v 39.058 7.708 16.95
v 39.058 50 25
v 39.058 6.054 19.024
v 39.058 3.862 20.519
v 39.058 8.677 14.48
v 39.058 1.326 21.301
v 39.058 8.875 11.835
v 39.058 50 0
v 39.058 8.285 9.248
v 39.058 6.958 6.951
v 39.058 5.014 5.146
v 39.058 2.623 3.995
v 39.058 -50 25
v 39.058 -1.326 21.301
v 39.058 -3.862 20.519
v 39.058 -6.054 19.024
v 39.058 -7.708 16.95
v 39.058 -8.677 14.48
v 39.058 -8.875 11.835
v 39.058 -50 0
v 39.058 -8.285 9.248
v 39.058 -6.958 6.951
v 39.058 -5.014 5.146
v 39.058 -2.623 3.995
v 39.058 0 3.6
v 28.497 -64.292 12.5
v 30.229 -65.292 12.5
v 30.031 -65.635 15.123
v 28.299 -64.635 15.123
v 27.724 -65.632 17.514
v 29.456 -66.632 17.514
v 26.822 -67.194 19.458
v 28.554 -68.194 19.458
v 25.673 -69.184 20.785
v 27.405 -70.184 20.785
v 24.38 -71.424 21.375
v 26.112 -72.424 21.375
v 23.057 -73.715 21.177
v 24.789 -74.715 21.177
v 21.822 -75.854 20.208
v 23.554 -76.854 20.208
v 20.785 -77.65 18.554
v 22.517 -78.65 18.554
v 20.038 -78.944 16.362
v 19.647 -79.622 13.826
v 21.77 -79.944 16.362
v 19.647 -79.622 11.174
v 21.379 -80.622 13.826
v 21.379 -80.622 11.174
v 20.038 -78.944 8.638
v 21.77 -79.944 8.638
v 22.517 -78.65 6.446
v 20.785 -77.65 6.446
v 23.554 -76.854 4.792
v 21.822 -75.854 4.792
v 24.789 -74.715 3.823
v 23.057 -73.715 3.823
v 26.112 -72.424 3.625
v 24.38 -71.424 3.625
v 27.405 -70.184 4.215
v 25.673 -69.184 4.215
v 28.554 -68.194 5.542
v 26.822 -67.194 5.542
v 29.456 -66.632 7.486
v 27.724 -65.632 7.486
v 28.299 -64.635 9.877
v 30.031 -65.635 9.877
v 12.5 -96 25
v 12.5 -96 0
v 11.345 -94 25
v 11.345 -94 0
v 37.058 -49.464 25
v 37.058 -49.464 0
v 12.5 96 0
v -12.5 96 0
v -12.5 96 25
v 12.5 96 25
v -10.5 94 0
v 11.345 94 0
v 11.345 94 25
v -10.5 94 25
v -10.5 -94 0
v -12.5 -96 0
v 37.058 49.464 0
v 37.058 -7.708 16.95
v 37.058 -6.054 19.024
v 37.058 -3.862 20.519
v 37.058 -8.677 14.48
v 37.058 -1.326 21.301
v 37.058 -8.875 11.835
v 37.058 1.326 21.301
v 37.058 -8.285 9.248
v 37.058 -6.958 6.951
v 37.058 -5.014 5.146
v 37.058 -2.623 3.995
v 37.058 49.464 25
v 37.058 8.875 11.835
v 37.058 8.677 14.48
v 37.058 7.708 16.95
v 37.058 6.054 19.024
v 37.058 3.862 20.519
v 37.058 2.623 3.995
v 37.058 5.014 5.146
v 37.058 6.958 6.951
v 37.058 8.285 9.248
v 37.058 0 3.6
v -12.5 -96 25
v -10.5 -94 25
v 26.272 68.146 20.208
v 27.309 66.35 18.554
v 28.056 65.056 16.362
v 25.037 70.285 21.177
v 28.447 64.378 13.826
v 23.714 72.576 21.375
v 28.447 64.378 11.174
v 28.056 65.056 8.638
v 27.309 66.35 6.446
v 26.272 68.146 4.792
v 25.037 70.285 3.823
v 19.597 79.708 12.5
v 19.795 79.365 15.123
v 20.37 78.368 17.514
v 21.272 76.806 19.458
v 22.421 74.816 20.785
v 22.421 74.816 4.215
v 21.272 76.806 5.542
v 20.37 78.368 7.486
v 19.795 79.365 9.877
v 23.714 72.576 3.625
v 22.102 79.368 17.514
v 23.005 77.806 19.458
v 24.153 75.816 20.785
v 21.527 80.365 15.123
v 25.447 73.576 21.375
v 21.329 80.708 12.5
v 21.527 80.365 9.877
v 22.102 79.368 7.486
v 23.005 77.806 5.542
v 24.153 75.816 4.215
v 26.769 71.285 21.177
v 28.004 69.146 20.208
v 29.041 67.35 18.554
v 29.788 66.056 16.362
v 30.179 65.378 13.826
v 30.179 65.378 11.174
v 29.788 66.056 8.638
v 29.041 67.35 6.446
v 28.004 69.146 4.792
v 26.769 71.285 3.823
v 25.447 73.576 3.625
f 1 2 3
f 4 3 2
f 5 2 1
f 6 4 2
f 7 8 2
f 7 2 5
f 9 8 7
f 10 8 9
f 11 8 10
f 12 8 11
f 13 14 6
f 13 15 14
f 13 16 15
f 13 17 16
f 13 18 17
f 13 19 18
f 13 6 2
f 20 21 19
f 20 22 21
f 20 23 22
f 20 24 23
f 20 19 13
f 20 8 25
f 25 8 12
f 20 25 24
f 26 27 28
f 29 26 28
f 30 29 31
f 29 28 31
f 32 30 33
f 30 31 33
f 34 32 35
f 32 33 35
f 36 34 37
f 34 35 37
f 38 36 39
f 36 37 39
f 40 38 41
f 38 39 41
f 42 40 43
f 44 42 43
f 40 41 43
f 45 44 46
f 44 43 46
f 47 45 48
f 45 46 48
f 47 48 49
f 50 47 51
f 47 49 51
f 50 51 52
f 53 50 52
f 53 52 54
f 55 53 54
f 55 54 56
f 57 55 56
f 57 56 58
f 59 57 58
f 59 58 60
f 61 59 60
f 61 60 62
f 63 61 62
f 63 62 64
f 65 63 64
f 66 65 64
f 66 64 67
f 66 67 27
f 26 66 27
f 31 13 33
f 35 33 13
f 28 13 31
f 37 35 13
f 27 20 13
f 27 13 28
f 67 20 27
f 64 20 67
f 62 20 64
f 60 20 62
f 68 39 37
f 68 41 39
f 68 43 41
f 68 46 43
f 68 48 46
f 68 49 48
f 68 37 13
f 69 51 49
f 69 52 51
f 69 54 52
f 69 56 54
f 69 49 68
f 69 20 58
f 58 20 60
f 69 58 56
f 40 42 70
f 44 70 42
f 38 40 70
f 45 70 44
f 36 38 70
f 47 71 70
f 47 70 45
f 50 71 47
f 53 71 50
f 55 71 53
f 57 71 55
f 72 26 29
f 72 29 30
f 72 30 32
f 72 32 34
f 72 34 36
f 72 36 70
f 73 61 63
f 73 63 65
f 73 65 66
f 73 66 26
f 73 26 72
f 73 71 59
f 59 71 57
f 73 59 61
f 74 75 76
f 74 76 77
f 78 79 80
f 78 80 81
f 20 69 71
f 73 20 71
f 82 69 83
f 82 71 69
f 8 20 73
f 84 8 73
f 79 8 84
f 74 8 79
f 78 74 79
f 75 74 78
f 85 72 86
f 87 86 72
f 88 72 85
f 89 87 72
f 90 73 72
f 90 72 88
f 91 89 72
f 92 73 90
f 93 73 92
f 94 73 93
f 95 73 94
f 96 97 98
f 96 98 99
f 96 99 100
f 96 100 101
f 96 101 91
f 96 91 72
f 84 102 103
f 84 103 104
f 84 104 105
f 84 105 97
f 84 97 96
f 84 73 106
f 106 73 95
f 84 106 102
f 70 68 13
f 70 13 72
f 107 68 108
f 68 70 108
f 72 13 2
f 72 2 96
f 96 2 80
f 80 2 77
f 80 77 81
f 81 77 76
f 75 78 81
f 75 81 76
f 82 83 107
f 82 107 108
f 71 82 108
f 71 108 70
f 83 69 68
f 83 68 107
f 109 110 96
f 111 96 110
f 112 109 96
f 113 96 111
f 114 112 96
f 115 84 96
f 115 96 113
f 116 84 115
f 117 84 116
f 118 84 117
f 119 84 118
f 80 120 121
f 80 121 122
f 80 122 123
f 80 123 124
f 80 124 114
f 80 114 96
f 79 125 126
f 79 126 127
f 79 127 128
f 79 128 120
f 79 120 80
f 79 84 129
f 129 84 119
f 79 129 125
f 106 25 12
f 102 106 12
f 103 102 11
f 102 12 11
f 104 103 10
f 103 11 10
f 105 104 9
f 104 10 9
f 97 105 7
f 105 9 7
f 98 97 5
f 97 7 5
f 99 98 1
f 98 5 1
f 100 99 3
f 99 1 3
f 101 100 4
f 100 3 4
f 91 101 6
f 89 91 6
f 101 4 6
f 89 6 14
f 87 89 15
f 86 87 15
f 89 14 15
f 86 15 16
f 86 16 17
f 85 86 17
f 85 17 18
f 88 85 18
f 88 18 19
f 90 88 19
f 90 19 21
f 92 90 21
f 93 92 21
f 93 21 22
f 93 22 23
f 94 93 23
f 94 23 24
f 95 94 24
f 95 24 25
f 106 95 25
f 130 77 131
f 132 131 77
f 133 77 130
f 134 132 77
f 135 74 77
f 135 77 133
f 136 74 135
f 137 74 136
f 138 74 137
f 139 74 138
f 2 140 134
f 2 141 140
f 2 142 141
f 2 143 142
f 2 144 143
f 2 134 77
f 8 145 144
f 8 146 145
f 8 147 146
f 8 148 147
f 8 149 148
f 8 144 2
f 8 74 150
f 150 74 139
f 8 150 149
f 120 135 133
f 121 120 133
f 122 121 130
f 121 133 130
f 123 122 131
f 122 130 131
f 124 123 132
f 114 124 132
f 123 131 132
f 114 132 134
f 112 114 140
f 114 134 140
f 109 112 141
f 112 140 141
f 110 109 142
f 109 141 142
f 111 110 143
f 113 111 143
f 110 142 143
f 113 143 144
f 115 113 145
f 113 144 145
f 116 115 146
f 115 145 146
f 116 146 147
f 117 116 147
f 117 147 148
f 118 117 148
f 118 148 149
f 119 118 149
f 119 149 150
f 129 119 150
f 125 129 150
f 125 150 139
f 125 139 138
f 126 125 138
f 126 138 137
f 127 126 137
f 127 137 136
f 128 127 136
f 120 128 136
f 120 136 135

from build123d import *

# Parameters (mm, degrees)
SALIENTE_EXTRUIR2_DEPTH = 25
CROQUIS3_R              = 8.9
CORTAR_EXTRUIR1_DEPTH   = 25
CROQUIS4_R              = 8.9
CORTAR_EXTRUIR2_DEPTH   = 25
CROQUIS5_R              = 8.9
CORTAR_EXTRUIR3_DEPTH   = 25


with BuildPart() as part:
    # Croquis1 → Saliente-Extruir2 (new body)
    with BuildSketch(Plane.XY):
        Polygon((12.5, 96), (39.058112383, 50), (39.058112383, -50), (12.5, -96), (-12.5, -96), (-10.5, -94), (11.345299462, -94), (37.058112383, -49.464101615), (37.058112383, 49.464101615), (11.345299462, 94), (-10.5, 94), (-12.5, 96), align=None)
    extrude(amount=SALIENTE_EXTRUIR2_DEPTH)

    # Croquis3 → Cortar-Extruir1 (cut)
    with BuildSketch(Plane(origin=(39.058112383, 0, 0), x_dir=(0, 0, -1), z_dir=(1, 0, 0))):
        with Locations((-12.5, 0)):
            Circle(CROQUIS3_R)
    extrude(amount=-CORTAR_EXTRUIR1_DEPTH, mode=Mode.SUBTRACT)

    # Croquis4 → Cortar-Extruir2 (cut)
    with BuildSketch(Plane(origin=(50.944219382, 29.412658774, 0), x_dir=(0, 0, -1), z_dir=(0.8660254037844347, 0.500000000000007, 0))):
        with Locations(Location((-12.5, 50.330326381, 0), (0, 0, 90))):
            Circle(CROQUIS4_R)
    extrude(amount=-CORTAR_EXTRUIR2_DEPTH, mode=Mode.SUBTRACT)

    # Croquis5 → Cortar-Extruir3 (cut)
    with BuildSketch(Plane(origin=(50.944219382, -29.412658774, 0), x_dir=(0, 0, -1), z_dir=(0.8660254037844347, -0.500000000000007, 0))):
        with Locations(Location((-12.5, -50.330326381, 0), (0, 0, 90))):
            Circle(CROQUIS5_R)
    extrude(amount=-CORTAR_EXTRUIR3_DEPTH, mode=Mode.SUBTRACT)


solid = part.part
